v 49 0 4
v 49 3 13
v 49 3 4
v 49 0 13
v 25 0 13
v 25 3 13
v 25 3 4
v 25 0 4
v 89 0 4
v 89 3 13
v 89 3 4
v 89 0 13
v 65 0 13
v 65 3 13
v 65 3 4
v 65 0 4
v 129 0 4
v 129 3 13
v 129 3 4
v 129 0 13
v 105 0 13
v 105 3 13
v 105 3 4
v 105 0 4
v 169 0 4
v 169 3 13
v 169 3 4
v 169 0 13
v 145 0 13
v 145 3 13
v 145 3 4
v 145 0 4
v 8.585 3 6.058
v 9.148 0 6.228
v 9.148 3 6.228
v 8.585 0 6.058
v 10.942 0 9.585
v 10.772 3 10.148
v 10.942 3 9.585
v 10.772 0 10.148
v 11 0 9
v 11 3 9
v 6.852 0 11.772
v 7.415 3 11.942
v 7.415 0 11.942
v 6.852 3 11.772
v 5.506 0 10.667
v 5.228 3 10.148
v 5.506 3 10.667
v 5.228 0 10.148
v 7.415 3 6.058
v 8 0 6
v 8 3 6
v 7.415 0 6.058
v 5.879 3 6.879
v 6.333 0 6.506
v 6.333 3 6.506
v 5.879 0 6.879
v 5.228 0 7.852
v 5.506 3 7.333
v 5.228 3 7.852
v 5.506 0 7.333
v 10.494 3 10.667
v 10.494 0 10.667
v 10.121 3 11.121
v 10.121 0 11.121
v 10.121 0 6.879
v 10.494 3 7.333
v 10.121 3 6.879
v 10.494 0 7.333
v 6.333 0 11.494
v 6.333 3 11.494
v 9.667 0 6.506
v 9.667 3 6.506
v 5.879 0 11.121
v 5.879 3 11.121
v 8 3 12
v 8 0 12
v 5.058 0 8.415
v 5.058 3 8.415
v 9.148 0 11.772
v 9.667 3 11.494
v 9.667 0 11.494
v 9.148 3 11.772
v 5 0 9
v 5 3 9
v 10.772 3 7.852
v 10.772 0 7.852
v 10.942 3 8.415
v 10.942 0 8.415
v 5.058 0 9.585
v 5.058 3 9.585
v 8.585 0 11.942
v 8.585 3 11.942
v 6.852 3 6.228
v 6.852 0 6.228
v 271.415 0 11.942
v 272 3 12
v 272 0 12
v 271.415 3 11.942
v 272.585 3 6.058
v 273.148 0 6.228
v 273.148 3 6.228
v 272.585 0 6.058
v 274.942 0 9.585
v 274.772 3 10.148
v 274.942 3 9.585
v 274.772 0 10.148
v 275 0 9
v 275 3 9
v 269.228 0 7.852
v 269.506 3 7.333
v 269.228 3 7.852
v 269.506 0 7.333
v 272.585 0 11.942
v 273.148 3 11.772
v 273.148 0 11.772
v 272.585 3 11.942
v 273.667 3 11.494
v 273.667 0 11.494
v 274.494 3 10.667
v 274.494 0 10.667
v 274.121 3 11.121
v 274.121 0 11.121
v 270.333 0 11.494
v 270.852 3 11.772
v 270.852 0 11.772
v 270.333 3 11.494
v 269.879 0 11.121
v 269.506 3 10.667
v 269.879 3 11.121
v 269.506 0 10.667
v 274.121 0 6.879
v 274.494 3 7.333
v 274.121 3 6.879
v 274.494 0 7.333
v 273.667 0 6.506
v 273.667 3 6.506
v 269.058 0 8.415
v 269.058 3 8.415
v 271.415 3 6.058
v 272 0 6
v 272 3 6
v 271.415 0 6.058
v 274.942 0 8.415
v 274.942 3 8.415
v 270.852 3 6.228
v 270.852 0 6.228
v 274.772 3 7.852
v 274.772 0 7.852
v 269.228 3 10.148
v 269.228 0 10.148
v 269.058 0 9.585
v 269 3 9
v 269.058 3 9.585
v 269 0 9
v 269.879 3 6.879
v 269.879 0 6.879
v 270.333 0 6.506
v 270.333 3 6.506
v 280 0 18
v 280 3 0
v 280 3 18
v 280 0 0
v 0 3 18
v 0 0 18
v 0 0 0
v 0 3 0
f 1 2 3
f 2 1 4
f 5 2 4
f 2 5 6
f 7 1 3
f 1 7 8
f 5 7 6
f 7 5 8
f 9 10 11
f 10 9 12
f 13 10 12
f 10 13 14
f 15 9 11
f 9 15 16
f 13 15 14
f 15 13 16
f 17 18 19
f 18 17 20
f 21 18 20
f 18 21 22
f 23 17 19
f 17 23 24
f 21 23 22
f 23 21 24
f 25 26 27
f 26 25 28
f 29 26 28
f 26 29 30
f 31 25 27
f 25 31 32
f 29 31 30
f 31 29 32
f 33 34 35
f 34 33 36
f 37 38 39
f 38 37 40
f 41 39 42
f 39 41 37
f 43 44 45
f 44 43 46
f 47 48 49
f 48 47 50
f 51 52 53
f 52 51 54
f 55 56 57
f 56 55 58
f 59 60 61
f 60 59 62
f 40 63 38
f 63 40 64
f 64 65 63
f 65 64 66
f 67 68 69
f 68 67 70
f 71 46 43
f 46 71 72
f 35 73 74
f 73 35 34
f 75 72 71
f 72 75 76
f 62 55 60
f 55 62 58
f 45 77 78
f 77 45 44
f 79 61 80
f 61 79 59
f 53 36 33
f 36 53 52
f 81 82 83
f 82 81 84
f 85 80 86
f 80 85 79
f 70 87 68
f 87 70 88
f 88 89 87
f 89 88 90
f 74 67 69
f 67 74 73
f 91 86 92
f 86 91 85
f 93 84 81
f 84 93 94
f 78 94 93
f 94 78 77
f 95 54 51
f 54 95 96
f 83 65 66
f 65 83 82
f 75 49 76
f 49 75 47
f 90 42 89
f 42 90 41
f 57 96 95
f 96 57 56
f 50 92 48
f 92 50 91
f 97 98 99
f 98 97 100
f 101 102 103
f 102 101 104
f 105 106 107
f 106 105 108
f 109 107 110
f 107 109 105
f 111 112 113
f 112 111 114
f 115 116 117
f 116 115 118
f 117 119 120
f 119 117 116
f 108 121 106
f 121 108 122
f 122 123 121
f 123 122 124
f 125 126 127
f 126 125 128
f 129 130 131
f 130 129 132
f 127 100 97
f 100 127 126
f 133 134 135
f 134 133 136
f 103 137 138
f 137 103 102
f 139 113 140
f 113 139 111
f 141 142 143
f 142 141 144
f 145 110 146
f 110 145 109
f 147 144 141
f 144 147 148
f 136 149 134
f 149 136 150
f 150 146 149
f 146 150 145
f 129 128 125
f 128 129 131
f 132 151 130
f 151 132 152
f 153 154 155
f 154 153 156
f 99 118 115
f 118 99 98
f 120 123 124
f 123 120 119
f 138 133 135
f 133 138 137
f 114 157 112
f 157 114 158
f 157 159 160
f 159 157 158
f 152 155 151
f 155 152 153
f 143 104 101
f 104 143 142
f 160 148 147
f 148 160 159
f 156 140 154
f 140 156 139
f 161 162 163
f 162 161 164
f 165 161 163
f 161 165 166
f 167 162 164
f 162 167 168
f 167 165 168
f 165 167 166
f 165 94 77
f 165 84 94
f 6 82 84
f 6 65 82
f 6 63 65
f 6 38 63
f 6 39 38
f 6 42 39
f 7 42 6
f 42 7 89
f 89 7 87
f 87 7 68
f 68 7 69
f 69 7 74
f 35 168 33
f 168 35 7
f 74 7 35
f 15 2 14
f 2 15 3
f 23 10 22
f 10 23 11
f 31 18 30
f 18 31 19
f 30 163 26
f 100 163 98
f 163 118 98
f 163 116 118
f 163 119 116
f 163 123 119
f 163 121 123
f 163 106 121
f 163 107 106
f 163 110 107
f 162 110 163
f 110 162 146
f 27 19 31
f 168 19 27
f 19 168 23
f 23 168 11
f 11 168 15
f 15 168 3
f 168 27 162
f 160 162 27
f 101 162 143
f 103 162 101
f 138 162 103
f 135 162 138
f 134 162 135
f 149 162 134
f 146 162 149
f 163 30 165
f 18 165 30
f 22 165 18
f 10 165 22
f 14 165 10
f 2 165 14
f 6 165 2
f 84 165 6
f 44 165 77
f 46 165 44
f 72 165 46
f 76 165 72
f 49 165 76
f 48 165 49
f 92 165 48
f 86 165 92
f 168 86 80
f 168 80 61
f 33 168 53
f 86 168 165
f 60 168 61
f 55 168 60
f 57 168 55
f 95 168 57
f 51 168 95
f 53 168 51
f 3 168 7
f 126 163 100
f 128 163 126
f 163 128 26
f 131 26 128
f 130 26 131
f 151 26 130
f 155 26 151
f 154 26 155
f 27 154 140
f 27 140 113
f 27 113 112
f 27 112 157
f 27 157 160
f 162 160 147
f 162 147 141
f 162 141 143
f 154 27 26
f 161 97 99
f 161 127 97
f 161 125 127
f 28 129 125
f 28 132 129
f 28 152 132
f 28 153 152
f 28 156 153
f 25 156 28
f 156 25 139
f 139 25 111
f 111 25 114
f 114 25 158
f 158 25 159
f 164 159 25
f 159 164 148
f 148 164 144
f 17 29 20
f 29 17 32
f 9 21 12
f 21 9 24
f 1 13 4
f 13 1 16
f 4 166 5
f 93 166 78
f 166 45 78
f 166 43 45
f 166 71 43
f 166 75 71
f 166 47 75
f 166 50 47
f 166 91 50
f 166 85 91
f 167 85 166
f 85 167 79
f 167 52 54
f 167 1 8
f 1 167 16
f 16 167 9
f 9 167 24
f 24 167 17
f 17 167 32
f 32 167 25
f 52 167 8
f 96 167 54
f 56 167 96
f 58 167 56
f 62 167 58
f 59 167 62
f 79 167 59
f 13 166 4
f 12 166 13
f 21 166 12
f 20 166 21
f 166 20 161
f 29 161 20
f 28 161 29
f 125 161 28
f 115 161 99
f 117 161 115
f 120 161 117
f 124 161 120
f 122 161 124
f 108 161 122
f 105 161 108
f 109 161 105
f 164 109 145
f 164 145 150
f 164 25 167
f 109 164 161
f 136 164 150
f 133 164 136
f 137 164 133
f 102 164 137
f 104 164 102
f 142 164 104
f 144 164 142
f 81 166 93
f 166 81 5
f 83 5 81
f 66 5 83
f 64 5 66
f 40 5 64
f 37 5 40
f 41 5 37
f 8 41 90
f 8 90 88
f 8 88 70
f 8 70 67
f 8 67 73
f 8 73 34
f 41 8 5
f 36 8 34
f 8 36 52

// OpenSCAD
// Concept only. Provisional dimensions in mm.
$fn=32;
difference(){cube([280,3,18]);for(x=[25,65,105,145])translate([x,-1,4])cube([24,5,9]);for(x=[8,272])translate([x,4,9])rotate([90,0,0])cylinder(h=6,r=3);}
